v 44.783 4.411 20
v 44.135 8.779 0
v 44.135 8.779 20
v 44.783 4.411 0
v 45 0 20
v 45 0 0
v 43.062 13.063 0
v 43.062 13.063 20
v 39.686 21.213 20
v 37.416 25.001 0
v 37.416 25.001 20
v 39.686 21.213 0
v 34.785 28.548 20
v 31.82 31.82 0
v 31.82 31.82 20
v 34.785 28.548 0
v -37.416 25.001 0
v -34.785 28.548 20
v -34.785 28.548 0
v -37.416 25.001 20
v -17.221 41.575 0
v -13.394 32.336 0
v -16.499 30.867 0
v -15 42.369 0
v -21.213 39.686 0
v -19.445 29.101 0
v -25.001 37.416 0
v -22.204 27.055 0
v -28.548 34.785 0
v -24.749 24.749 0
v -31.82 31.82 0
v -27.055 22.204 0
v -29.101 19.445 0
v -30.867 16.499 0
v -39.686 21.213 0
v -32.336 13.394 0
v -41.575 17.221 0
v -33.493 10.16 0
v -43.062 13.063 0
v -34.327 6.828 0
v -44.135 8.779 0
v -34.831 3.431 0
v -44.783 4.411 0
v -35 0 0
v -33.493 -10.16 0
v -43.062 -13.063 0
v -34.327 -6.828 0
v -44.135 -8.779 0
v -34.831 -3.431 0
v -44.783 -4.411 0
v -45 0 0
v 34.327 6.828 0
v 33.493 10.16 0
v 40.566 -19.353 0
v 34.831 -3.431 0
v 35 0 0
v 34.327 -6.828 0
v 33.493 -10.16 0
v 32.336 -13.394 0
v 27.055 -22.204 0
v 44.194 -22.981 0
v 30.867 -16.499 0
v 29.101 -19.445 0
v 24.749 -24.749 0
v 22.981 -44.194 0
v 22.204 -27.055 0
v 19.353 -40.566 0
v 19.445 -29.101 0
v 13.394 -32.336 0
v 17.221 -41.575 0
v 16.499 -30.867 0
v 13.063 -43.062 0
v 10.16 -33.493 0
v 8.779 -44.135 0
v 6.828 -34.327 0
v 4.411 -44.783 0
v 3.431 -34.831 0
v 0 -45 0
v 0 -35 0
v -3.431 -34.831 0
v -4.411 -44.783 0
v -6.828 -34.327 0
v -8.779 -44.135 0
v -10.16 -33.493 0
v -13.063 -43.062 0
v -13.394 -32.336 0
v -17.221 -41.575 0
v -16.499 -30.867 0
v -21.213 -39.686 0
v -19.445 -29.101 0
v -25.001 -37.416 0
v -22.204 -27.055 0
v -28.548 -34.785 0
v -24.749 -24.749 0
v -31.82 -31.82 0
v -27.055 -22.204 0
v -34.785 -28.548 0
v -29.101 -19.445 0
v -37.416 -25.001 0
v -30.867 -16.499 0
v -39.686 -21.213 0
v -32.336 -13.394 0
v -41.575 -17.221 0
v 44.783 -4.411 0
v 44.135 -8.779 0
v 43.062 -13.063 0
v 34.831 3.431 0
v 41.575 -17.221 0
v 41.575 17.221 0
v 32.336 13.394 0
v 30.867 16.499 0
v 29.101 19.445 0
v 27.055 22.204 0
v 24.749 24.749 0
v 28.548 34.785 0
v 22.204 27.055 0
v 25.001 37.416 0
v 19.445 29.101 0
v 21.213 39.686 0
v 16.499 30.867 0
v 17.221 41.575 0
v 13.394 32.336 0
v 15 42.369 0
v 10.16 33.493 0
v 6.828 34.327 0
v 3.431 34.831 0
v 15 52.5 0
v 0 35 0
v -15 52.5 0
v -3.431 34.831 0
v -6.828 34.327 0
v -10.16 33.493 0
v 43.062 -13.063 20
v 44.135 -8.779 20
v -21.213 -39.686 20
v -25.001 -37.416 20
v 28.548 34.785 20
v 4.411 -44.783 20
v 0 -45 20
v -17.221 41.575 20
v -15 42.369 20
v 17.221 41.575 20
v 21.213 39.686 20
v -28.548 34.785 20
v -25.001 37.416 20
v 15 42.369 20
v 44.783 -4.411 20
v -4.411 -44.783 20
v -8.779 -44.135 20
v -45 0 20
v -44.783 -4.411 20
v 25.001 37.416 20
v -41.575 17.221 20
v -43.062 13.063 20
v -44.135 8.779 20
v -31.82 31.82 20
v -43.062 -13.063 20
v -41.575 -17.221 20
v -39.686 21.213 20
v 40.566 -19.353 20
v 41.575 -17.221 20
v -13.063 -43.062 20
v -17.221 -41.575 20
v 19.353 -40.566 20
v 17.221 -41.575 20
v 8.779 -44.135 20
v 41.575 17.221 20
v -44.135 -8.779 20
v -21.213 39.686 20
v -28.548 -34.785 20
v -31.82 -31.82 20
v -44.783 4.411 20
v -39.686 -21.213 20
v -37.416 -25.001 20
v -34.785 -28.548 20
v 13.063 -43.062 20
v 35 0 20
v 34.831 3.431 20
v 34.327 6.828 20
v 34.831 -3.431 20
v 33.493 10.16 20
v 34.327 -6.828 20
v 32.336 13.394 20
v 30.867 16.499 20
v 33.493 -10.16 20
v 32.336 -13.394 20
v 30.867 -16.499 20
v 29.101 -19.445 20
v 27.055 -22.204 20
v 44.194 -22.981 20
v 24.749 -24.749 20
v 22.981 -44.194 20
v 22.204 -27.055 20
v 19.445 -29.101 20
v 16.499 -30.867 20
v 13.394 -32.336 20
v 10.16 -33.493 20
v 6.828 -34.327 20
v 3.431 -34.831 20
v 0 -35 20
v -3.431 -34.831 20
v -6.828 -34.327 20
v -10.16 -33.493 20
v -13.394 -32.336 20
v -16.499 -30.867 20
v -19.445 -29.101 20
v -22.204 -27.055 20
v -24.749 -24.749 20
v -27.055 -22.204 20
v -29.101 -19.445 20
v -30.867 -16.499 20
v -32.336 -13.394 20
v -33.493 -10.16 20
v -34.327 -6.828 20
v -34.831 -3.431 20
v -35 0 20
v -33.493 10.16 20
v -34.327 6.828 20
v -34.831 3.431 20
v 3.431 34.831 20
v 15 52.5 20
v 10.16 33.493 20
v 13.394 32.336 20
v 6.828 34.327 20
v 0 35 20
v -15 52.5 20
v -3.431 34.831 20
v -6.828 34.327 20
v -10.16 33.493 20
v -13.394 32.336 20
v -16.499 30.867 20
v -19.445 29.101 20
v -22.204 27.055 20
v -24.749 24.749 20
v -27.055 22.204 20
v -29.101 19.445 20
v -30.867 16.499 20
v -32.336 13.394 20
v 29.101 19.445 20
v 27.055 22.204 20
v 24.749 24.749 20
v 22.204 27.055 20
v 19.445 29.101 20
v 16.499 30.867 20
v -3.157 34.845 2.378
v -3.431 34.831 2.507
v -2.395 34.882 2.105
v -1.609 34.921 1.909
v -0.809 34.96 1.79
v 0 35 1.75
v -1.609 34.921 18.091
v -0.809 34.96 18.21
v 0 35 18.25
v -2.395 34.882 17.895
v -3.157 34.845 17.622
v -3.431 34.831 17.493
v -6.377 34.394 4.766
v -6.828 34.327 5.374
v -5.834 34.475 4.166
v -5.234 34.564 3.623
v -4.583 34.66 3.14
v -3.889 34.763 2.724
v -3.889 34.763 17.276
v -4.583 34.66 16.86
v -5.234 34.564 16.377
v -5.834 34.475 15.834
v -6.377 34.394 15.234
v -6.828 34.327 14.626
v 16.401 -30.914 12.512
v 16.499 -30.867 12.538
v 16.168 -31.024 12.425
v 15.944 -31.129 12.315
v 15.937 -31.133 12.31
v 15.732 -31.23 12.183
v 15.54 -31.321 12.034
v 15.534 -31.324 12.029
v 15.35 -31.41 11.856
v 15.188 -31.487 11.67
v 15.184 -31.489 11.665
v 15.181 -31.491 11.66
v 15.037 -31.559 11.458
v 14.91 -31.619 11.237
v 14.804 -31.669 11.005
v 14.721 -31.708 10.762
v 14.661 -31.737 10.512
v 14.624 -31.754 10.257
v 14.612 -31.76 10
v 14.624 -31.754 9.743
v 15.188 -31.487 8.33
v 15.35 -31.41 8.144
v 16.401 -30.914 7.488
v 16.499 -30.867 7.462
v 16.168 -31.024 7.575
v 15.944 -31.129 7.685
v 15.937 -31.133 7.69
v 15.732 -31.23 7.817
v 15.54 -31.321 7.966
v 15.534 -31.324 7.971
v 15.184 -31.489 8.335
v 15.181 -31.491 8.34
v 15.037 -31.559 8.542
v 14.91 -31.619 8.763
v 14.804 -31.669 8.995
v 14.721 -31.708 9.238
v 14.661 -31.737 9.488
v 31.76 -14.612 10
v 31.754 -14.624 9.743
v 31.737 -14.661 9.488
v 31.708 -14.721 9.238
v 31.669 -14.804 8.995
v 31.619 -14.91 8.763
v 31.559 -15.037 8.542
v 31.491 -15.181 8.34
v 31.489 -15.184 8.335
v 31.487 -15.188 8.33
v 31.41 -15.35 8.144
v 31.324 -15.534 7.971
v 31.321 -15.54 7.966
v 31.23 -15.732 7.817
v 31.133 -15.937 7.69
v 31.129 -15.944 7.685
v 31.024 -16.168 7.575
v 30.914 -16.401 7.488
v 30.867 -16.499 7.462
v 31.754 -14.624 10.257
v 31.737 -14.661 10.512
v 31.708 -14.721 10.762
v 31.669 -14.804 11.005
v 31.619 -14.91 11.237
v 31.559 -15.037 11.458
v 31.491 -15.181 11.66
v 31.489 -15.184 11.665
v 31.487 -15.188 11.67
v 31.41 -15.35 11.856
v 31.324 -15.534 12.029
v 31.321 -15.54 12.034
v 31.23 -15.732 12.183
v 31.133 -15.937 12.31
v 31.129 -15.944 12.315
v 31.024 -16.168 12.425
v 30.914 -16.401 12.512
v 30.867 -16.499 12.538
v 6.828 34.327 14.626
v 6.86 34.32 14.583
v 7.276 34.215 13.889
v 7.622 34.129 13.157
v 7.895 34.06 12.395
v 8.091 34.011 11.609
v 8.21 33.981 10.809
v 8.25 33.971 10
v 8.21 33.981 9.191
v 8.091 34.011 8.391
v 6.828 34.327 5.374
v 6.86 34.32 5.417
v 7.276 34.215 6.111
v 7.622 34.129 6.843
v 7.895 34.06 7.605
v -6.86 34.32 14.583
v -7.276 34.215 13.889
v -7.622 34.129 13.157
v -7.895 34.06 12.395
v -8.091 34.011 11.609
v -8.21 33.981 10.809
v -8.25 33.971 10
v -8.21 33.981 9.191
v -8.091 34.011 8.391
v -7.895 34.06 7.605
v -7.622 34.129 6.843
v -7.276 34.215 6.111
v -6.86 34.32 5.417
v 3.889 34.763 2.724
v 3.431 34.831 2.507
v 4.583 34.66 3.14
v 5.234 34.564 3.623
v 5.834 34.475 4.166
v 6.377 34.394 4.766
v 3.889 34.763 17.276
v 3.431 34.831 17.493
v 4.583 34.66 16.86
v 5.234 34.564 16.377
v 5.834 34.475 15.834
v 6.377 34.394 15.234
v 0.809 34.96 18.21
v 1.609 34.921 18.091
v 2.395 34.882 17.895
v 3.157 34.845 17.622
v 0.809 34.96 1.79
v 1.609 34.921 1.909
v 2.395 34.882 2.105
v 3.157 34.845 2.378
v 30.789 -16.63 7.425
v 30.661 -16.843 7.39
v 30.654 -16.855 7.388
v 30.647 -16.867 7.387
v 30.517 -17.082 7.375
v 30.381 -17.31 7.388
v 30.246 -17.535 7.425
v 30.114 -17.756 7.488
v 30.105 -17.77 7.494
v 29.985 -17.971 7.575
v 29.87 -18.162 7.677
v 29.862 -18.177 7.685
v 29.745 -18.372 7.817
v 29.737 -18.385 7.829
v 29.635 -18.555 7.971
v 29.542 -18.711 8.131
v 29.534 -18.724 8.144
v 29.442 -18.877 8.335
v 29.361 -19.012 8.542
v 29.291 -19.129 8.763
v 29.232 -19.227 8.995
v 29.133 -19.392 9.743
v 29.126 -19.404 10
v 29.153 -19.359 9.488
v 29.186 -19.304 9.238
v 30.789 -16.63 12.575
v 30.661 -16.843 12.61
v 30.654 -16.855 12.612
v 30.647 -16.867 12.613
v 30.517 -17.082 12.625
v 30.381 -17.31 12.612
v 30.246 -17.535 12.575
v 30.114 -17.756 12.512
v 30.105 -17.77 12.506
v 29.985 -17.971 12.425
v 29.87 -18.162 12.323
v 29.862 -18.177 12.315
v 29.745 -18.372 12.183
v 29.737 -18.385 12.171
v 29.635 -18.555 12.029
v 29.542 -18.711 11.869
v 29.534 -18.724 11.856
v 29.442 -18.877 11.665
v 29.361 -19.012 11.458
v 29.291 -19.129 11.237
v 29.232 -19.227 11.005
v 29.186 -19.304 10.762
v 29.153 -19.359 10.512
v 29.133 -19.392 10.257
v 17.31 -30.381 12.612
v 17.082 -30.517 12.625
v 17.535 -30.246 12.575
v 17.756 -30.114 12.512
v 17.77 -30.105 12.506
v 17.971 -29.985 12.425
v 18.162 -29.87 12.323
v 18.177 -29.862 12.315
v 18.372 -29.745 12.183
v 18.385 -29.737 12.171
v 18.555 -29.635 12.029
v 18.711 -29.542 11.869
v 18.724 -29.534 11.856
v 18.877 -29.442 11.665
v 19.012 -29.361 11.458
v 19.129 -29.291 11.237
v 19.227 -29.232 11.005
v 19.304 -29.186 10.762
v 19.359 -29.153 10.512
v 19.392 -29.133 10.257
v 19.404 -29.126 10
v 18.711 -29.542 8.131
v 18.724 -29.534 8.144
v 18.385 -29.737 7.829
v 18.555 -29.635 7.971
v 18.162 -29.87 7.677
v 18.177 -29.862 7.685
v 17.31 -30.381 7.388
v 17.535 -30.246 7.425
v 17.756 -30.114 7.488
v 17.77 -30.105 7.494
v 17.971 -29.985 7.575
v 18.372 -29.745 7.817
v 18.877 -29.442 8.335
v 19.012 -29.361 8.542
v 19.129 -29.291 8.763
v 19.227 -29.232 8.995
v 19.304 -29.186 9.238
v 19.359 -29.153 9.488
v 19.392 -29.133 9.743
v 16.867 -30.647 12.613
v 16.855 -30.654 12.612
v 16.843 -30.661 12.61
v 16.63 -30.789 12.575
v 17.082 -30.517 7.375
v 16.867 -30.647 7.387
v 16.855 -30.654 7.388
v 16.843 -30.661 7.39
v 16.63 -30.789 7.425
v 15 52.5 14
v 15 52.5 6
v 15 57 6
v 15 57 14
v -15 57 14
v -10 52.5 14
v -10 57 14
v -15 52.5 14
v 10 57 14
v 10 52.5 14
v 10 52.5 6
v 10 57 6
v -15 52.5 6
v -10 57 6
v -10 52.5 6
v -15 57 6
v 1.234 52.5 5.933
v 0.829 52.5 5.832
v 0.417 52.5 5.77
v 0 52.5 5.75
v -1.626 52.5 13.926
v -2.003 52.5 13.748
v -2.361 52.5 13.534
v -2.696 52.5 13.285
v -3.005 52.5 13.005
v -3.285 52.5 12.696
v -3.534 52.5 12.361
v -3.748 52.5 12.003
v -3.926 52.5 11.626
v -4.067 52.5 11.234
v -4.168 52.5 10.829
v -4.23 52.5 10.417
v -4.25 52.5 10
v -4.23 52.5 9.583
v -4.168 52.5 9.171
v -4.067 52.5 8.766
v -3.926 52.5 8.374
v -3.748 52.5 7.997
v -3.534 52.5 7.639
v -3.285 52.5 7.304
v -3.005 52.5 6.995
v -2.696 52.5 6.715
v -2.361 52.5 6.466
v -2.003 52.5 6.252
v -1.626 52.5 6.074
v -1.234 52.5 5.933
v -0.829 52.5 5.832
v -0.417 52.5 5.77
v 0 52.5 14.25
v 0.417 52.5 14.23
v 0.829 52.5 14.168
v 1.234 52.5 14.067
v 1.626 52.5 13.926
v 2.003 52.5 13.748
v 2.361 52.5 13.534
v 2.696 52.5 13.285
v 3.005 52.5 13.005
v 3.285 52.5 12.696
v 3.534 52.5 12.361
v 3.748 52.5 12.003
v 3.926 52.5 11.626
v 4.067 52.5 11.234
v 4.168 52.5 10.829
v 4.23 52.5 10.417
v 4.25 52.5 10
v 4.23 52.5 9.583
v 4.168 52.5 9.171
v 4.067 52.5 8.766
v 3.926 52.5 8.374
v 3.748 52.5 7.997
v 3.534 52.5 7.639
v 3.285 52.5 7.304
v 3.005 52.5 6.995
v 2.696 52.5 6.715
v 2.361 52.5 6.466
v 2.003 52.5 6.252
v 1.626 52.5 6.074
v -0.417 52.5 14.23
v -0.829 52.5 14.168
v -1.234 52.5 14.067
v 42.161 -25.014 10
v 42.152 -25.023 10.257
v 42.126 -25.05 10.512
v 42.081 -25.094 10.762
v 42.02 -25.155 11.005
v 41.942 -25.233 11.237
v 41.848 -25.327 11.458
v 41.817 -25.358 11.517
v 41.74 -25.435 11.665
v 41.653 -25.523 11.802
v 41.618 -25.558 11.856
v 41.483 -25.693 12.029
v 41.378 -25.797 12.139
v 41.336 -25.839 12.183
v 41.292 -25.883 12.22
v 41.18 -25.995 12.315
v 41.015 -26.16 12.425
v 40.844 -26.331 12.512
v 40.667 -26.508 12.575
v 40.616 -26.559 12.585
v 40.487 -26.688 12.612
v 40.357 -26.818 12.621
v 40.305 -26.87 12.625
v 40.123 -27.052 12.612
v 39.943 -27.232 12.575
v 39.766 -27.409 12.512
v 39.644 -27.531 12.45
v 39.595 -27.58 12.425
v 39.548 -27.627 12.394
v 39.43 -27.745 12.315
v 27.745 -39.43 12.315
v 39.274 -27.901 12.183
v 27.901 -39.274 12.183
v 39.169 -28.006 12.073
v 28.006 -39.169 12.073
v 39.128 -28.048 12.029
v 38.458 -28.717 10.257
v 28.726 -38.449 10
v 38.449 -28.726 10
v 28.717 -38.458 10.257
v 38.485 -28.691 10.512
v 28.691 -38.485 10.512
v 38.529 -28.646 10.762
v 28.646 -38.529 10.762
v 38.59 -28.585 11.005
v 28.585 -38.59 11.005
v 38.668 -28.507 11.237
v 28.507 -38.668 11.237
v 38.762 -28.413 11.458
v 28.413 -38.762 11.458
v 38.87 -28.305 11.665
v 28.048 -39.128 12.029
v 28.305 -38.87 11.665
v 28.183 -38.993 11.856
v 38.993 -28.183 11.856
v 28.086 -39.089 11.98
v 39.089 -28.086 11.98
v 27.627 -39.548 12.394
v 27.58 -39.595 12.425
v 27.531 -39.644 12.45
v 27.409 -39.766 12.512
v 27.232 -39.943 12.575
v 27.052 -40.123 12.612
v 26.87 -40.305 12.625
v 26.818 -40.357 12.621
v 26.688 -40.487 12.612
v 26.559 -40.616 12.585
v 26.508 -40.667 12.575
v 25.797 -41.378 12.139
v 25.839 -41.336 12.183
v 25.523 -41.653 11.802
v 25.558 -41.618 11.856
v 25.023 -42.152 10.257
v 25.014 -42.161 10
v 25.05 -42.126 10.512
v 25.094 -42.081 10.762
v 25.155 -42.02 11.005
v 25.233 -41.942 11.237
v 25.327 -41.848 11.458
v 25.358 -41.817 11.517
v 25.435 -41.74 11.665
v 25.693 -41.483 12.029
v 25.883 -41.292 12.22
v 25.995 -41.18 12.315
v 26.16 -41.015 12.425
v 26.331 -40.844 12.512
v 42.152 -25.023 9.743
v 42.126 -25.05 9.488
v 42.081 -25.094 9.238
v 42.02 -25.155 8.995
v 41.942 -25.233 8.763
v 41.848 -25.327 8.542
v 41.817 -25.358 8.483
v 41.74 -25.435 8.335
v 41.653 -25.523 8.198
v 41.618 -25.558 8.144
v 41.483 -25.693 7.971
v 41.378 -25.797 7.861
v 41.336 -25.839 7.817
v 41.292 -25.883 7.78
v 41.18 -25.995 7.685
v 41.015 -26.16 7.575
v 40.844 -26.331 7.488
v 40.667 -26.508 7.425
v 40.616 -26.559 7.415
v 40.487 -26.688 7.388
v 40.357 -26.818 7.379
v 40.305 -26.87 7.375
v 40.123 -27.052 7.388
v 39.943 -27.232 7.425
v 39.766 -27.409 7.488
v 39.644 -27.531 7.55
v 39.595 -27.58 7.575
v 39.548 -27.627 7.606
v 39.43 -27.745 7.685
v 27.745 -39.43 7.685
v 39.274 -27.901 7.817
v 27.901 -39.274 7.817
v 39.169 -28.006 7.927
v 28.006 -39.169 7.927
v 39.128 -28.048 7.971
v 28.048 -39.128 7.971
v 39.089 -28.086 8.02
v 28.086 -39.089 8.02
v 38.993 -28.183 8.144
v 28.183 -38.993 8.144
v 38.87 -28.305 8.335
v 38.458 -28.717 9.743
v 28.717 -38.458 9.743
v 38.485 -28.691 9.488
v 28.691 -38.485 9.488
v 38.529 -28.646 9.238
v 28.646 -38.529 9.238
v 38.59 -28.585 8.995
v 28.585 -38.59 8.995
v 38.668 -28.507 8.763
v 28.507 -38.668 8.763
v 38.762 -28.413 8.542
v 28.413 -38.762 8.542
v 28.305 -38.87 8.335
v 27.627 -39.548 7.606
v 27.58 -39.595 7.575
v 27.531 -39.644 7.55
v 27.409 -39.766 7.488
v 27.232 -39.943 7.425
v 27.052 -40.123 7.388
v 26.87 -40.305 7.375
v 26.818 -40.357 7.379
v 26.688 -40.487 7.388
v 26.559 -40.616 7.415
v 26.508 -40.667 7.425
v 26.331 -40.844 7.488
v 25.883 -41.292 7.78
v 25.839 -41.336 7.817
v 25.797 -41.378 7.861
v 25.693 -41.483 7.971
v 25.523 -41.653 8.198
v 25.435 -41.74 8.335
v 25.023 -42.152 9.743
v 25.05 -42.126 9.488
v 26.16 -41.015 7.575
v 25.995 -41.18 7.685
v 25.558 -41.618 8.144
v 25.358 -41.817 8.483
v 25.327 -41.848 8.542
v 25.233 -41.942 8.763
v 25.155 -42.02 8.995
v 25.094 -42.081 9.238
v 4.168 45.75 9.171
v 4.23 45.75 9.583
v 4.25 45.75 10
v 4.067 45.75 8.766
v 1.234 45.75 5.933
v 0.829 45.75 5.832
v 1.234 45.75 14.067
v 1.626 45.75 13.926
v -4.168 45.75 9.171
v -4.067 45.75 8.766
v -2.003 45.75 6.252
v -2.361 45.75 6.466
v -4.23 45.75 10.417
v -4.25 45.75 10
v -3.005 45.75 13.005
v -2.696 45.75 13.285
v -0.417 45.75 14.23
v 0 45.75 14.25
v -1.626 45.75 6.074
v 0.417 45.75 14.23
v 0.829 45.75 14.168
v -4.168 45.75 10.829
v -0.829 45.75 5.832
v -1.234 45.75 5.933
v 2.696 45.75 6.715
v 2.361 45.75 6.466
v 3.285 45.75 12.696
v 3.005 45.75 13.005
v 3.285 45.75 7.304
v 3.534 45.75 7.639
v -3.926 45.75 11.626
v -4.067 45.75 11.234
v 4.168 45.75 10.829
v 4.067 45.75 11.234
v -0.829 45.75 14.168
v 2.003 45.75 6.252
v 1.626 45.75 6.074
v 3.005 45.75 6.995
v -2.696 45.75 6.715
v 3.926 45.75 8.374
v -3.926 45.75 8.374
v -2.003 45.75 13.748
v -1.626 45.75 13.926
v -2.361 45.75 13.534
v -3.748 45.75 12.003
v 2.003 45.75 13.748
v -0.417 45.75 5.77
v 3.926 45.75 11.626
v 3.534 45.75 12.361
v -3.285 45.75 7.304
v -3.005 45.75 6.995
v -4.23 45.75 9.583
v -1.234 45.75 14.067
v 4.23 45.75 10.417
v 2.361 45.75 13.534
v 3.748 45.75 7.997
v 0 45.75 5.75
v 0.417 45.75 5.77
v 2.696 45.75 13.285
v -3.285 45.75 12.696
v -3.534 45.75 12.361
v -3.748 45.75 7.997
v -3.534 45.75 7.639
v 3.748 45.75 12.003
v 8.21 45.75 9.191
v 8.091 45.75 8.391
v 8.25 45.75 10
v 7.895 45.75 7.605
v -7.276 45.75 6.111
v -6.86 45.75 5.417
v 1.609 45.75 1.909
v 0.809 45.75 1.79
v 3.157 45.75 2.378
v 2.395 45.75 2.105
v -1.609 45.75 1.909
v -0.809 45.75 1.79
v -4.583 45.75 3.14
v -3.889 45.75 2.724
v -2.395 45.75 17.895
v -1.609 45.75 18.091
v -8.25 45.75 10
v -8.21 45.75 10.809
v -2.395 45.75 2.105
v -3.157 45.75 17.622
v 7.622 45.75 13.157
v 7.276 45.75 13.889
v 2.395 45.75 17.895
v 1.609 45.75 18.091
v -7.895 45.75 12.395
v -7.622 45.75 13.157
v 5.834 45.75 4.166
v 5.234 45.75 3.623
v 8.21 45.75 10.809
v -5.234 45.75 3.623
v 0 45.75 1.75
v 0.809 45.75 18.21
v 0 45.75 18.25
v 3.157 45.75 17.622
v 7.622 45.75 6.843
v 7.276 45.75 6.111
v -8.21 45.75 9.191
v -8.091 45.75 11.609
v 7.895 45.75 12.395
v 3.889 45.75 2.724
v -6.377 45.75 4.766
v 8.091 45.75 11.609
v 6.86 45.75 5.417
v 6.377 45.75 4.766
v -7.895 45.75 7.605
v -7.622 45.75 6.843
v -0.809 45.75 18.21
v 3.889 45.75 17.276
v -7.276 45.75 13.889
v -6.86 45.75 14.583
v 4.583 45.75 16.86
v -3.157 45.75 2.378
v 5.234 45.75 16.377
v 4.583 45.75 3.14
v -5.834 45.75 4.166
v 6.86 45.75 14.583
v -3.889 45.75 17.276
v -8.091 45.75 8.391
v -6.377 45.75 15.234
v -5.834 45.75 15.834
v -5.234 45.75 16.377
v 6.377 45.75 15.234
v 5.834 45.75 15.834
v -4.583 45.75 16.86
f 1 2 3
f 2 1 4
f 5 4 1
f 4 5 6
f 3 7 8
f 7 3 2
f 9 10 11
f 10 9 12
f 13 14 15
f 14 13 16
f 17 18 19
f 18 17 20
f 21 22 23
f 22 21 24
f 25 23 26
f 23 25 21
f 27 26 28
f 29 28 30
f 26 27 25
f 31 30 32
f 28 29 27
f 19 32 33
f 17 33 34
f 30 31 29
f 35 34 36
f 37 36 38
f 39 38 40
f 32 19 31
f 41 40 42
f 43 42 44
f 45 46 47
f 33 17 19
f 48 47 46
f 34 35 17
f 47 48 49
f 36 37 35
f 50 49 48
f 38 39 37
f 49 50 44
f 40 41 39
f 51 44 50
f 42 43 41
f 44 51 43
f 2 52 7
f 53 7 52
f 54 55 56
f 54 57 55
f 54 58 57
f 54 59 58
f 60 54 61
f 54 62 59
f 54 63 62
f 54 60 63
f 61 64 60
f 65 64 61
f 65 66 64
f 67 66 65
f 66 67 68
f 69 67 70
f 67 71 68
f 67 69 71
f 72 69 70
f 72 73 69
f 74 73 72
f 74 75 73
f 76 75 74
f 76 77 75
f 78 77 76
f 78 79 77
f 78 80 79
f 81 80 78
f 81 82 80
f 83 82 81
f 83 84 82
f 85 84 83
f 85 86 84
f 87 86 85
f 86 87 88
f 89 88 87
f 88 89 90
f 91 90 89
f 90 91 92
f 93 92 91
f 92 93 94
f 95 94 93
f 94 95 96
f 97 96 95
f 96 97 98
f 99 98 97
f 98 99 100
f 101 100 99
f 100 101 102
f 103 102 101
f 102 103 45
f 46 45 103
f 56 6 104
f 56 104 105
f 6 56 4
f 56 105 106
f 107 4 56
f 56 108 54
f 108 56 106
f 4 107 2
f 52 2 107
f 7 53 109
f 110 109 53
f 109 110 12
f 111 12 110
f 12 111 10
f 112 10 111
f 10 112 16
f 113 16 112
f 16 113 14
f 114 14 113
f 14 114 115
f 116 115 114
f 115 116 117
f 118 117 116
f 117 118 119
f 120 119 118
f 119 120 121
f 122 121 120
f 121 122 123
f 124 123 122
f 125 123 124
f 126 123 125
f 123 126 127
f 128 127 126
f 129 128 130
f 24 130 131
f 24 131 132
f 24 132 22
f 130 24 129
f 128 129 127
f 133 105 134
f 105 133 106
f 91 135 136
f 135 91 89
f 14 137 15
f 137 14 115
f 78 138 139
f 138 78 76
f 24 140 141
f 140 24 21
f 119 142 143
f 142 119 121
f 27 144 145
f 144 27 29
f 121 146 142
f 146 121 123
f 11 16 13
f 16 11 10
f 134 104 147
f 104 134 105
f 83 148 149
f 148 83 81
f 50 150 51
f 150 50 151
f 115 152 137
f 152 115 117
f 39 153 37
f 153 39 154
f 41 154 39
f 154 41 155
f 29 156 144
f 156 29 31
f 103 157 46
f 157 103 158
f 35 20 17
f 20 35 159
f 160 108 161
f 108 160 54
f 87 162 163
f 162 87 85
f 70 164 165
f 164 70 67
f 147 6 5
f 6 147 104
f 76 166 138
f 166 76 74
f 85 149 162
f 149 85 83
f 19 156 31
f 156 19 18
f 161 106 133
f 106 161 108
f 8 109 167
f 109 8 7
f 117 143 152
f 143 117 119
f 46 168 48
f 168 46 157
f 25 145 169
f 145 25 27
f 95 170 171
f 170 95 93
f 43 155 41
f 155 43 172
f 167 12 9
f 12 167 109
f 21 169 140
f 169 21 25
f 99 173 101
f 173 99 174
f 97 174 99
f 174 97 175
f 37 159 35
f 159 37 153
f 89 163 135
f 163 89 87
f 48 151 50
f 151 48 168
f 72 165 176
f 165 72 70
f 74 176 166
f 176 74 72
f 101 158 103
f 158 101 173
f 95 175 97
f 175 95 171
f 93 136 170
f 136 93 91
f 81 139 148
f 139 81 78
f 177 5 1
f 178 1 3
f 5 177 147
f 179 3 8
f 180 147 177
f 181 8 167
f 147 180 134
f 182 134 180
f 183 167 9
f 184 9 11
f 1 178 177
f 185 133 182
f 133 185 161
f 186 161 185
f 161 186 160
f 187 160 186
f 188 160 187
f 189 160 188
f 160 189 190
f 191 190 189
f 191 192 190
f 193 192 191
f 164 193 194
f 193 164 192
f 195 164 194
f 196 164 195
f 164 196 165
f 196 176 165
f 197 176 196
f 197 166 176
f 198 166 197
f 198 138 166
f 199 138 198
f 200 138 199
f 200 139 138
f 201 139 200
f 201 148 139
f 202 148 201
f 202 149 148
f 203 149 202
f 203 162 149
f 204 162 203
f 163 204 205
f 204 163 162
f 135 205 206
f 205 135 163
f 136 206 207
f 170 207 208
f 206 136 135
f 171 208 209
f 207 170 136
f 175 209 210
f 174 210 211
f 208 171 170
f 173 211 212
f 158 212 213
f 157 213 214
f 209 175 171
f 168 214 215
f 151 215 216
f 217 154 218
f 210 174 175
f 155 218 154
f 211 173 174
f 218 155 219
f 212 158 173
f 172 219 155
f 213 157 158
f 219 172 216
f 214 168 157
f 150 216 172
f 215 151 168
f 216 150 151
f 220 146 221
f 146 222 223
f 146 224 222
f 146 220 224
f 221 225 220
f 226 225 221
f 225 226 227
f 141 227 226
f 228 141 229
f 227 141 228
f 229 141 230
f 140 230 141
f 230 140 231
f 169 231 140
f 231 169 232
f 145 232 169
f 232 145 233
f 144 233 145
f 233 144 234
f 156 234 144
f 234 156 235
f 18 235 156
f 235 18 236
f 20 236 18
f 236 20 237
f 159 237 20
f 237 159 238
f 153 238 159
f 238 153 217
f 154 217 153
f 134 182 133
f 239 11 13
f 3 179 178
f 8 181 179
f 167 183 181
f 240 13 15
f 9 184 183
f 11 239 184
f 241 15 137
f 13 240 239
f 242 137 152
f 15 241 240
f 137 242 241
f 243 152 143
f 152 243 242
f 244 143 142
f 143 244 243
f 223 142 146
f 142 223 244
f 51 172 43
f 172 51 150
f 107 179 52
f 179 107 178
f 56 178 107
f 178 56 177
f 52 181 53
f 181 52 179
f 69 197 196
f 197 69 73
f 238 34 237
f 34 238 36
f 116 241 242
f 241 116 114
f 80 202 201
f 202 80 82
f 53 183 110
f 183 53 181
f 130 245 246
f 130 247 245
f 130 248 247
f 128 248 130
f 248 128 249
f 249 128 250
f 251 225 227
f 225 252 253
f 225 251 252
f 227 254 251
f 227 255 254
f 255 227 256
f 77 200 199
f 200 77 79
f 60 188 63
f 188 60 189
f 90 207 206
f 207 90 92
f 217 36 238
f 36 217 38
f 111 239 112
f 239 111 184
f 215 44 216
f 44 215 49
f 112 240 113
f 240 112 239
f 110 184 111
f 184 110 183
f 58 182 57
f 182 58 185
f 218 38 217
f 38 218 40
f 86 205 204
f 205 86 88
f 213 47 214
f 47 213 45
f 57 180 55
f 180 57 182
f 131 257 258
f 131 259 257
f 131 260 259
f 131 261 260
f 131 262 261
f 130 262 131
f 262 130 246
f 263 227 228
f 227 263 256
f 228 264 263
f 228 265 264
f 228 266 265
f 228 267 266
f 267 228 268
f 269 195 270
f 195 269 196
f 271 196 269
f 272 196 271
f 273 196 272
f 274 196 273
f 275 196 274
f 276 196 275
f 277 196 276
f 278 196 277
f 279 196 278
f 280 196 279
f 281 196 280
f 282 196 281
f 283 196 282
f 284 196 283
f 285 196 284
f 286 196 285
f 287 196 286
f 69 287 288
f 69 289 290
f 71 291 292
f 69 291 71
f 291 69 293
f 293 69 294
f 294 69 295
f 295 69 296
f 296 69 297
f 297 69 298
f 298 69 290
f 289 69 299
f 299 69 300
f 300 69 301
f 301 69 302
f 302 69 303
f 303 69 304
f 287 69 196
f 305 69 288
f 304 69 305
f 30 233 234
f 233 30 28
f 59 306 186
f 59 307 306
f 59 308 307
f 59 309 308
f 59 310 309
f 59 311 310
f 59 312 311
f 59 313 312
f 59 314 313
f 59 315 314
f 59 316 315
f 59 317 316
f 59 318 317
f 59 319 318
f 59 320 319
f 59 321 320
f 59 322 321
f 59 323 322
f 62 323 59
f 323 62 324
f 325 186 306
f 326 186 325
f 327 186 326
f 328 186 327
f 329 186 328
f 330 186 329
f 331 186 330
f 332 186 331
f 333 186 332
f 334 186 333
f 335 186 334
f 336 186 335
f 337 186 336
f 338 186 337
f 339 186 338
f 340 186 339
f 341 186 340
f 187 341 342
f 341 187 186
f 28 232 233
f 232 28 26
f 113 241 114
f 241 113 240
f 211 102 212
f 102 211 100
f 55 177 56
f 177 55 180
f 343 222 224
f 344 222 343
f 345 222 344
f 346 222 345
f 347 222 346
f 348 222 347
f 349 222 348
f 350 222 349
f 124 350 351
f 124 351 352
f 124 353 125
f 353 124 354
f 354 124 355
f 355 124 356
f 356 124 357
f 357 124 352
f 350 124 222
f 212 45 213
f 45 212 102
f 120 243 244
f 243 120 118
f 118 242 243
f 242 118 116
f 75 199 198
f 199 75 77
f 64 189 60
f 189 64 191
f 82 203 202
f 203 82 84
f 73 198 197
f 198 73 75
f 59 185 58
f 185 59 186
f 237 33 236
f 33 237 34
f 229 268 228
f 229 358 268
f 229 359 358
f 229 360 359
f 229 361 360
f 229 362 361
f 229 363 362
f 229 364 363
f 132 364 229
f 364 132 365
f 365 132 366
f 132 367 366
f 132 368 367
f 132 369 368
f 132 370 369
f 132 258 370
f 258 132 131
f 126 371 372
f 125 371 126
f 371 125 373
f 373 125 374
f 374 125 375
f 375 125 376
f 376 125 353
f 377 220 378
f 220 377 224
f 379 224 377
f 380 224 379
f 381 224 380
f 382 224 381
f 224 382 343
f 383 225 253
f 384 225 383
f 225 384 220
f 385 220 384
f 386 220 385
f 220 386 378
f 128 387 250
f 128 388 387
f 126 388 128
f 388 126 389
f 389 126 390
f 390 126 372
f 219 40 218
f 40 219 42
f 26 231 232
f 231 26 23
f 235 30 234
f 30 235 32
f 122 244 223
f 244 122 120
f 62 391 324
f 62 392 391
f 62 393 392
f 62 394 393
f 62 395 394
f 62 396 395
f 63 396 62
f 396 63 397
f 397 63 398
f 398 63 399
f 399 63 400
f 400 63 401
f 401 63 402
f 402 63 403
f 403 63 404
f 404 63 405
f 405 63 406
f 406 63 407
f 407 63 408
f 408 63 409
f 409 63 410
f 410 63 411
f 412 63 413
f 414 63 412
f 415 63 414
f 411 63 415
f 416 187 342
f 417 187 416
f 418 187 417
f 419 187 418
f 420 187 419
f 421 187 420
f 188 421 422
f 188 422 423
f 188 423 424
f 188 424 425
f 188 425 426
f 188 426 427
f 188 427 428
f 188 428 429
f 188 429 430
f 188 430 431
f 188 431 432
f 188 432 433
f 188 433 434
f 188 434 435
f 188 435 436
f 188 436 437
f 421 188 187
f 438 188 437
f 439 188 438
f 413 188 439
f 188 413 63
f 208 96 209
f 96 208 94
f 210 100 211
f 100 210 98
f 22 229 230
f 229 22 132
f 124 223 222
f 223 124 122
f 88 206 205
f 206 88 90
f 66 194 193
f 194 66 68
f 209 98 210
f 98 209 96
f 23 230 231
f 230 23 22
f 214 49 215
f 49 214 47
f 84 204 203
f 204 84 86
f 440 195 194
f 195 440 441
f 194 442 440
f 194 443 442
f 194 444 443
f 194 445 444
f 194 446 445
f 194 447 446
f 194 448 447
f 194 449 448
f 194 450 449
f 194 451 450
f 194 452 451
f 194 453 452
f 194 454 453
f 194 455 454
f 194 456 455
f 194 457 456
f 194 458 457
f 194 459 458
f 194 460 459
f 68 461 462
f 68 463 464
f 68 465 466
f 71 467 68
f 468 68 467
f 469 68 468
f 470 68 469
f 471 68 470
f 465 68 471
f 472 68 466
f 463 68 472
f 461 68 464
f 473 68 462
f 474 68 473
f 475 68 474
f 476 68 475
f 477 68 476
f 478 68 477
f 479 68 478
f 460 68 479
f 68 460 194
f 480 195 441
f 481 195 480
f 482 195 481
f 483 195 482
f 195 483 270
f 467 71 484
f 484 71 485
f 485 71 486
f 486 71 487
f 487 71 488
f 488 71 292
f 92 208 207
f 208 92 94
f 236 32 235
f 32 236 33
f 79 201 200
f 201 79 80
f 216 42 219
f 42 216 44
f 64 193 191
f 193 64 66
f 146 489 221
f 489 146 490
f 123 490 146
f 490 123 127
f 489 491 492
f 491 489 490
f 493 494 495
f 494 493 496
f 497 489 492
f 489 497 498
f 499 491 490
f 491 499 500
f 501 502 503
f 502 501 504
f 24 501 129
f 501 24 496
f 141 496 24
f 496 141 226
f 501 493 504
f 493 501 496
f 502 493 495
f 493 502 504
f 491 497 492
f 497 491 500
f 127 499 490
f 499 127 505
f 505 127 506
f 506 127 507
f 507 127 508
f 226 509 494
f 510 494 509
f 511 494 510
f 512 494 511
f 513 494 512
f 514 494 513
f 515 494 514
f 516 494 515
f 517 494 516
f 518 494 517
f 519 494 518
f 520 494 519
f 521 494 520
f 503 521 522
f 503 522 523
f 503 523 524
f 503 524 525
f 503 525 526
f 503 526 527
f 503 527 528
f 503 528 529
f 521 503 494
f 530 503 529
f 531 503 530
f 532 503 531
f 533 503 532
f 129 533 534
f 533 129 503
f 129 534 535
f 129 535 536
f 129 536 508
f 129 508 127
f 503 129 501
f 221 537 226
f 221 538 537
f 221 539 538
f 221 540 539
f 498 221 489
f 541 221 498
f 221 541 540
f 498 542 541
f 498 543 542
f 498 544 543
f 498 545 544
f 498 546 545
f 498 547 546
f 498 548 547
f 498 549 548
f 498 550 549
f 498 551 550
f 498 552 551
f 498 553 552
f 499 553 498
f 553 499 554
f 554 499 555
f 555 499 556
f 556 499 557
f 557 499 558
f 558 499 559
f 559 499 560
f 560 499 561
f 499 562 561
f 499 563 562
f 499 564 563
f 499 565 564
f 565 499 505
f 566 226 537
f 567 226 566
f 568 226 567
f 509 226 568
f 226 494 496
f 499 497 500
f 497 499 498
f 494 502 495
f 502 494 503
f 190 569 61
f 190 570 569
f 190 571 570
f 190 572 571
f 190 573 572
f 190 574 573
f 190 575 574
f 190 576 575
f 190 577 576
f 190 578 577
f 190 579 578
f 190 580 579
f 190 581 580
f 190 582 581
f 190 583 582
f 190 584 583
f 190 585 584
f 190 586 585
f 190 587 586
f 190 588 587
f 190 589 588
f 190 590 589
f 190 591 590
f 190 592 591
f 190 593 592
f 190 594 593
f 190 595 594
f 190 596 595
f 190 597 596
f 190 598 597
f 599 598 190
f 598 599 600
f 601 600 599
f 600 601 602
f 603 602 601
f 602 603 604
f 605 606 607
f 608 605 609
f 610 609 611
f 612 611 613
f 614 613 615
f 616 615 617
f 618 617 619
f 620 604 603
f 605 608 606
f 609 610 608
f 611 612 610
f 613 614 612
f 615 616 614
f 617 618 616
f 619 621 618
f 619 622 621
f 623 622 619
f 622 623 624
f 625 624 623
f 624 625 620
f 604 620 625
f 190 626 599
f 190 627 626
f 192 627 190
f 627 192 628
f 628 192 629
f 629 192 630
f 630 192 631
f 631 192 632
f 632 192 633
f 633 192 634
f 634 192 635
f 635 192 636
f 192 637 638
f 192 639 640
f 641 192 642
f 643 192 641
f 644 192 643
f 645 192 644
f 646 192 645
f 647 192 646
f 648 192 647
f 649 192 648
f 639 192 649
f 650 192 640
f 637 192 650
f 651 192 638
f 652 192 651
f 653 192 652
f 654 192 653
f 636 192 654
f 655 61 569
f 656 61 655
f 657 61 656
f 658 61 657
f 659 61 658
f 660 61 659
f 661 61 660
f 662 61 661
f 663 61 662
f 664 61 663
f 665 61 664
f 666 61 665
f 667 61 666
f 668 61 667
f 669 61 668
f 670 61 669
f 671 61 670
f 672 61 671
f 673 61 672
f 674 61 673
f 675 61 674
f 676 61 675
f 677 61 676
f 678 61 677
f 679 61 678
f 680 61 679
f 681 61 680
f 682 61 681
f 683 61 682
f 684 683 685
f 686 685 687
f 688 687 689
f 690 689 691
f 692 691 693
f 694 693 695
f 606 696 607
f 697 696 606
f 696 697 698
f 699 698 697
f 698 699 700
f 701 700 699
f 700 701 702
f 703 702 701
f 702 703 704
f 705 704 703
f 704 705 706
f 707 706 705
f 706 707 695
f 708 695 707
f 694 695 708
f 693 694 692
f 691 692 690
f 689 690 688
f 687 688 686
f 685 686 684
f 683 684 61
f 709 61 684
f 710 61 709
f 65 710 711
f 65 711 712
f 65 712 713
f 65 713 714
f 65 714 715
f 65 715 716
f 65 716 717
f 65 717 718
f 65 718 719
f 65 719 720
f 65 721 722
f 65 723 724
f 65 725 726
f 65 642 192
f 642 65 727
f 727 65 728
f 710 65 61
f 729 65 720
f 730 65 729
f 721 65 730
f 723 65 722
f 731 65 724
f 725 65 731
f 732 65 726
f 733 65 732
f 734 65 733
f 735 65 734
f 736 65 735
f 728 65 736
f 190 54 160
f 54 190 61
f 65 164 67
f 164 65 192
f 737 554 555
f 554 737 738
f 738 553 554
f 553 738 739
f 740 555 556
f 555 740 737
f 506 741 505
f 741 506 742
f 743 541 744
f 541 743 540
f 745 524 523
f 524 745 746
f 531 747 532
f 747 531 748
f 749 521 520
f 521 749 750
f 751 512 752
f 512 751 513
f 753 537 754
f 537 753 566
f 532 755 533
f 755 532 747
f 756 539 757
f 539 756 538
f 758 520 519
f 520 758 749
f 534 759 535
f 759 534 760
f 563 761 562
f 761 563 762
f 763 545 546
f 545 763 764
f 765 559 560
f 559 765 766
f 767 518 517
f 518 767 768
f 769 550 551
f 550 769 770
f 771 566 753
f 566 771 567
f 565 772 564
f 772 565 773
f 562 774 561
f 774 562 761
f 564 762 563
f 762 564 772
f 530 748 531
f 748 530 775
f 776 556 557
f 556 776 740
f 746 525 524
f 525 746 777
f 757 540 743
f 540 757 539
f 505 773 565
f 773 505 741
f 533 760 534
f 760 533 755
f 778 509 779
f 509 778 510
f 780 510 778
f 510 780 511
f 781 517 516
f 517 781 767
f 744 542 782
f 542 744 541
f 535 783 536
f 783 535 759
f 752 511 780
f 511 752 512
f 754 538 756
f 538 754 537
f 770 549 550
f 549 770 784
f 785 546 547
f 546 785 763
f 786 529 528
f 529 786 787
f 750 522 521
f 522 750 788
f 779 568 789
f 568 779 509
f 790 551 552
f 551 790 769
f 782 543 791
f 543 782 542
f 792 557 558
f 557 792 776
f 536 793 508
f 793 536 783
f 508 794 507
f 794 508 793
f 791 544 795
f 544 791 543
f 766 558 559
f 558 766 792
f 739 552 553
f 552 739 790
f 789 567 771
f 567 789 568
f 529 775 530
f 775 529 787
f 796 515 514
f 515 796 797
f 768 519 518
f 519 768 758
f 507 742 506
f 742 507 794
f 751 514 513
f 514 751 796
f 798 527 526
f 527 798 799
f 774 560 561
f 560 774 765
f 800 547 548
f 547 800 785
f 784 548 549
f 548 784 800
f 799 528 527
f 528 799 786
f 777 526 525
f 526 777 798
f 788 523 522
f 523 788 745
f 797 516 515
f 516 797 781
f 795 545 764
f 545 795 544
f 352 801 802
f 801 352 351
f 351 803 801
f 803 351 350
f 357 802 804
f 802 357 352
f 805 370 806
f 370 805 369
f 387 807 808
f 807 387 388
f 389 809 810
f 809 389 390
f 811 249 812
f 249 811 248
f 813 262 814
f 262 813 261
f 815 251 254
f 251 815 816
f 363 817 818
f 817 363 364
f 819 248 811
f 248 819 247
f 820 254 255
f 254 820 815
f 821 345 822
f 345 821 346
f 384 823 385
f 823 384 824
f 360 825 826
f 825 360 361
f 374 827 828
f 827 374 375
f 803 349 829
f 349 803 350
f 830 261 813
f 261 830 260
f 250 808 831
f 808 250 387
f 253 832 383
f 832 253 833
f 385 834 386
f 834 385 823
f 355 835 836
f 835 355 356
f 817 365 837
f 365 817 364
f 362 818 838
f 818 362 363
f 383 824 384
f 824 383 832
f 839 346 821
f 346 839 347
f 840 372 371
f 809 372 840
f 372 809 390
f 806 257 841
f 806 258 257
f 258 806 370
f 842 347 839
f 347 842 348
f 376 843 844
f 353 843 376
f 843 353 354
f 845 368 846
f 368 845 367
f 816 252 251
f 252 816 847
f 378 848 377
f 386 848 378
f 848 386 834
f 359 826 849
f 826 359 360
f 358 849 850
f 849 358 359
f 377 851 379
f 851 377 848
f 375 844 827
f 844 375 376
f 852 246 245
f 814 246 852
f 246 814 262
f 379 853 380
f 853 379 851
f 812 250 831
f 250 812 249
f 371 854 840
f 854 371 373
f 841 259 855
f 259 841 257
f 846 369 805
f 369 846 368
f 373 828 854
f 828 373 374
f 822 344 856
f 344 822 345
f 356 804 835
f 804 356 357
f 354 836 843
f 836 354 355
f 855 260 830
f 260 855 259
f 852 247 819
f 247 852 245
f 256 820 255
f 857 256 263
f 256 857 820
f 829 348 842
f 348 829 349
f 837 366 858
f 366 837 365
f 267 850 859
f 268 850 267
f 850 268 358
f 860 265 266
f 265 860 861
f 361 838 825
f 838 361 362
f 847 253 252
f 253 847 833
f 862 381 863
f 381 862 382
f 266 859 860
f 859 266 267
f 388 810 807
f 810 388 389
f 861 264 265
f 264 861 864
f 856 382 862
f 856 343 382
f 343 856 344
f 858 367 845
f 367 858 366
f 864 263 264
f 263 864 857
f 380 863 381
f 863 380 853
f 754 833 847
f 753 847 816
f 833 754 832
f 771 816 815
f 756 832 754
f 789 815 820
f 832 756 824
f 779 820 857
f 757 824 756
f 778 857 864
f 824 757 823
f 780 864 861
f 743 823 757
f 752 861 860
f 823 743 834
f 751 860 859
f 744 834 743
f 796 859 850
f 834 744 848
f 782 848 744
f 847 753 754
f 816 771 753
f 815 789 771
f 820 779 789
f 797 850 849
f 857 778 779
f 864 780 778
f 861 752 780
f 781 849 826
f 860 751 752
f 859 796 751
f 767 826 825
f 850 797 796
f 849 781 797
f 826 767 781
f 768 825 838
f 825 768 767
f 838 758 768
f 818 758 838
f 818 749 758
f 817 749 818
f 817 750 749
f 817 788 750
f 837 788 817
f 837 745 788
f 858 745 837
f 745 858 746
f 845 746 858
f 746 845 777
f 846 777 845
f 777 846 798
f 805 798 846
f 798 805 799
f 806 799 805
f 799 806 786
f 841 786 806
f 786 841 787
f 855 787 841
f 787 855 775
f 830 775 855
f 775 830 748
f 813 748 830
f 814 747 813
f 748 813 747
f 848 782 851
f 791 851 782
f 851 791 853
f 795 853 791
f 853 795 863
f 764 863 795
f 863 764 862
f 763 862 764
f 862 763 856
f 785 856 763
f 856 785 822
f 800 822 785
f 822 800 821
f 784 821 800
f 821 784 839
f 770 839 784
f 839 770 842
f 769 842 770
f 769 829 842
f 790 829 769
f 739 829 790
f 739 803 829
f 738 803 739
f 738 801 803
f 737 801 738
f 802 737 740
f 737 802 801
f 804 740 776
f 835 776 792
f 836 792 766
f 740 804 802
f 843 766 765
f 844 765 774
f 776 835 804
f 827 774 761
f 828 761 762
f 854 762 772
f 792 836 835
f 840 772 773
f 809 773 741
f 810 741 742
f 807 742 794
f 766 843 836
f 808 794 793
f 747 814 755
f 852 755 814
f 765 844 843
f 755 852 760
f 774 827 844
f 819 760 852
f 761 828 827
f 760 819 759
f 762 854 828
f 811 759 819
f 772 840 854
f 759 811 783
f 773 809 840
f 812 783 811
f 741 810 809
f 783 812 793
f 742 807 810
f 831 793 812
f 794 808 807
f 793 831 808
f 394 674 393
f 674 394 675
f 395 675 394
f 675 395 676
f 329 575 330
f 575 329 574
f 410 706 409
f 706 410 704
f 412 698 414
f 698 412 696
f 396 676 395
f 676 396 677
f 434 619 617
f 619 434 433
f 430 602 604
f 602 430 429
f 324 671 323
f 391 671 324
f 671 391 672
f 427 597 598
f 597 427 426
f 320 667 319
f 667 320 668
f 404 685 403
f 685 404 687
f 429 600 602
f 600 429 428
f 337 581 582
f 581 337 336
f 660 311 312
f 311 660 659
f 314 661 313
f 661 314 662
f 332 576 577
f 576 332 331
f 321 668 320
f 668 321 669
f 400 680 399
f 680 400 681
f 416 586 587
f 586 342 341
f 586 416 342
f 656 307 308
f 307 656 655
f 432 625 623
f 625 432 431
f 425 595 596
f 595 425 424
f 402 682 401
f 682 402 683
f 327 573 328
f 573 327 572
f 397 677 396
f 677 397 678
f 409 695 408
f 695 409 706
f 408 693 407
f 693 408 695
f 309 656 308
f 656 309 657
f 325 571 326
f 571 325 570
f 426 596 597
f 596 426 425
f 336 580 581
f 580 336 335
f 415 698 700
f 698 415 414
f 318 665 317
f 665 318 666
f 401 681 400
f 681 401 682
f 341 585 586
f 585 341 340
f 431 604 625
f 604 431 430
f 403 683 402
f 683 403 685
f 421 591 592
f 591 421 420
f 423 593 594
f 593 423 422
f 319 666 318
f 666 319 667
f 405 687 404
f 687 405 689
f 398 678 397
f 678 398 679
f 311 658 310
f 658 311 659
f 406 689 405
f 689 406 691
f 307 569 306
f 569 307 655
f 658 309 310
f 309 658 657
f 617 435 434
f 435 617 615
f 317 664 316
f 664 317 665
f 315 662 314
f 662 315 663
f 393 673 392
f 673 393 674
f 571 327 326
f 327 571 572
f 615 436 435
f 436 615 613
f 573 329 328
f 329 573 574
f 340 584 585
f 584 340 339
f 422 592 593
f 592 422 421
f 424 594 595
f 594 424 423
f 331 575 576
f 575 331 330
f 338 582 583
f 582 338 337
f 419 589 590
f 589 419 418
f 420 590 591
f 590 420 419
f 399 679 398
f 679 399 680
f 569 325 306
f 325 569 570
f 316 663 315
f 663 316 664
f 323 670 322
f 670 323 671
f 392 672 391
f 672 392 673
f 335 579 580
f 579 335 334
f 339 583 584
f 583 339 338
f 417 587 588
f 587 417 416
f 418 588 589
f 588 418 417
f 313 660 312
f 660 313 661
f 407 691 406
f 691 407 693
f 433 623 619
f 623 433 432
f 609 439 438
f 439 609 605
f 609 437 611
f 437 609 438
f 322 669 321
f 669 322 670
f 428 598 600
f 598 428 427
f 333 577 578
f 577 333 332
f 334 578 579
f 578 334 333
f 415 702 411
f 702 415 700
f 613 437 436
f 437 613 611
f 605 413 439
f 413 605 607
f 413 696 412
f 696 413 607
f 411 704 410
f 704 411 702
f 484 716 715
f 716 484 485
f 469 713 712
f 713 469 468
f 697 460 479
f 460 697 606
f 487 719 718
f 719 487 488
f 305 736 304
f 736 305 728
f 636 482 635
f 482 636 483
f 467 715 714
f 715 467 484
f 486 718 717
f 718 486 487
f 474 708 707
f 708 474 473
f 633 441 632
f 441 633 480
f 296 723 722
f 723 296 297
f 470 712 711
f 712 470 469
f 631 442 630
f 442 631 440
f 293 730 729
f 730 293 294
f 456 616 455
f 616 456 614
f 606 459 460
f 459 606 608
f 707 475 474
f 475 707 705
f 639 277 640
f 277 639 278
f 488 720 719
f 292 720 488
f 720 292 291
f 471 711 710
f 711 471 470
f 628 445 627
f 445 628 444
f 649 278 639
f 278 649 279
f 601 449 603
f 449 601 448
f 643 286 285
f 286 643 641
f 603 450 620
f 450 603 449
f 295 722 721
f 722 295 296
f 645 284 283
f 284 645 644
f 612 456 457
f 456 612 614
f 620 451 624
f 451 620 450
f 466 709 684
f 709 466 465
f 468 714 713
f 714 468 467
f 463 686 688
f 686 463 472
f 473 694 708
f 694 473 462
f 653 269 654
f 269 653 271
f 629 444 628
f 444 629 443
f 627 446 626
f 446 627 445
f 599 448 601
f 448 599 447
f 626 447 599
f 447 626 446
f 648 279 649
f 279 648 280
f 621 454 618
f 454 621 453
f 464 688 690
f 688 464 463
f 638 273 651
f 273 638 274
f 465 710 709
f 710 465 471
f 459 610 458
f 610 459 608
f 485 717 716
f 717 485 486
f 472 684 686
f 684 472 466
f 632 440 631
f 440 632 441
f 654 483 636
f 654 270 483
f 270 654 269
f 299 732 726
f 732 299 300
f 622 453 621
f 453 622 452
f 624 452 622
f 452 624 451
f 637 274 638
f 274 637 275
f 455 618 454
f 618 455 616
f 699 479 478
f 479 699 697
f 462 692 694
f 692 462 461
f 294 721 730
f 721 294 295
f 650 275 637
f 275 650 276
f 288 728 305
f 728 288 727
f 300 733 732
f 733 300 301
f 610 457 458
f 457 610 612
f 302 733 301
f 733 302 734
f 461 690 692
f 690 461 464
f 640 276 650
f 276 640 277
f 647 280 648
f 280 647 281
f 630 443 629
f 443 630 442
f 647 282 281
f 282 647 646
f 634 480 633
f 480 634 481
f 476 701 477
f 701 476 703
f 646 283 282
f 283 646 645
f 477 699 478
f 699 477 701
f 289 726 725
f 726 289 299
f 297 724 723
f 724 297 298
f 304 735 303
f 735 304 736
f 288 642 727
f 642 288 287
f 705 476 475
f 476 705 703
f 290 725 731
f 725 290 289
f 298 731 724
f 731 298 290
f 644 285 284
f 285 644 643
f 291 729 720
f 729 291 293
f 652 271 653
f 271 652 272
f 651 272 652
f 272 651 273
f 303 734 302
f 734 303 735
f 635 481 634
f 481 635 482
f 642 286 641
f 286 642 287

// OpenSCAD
// Föhnhalter, vong Bad her
$fn=64;
ring = [70, 20];
wall = 10;
chole = [5.25, 21, 19];
crot = -45;
shole = [4, 9, 2];
wallcube = [30, 12.5];
alu = [40, 8, 4.5];
alu_screw = [16.5, 8.5, 12];
insert_z = 20;

difference(){
	union(){
		difference(){
			cylinder(d=ring.x + 2*wall, h=ring.y);
			cylinder(d=ring.x, h=ring.y);
		}
		translate([-wallcube.x/2, ring.x/2+wall/2, 0]) cube([wallcube.x, wallcube.y, ring.y]);
		translate([-wallcube.x/2, ring.x/2+wallcube.y + wall/2, ring.y/2-alu.y/2]) difference(){
			 cube([wallcube.x, alu.z, alu.y]);
			 translate([wallcube.x/2-insert_z/2, 0, 0]) cube([insert_z, alu.z, alu.y]);

		}
		rotate([0, 0, crot]) translate([ring.x/2, -wallcube.x/2, 0]) cube([wallcube.y, wallcube.x, ring.y]);
	}

	translate([0, ring.x/2 - wallcube.y/2, ring.y/2]) rotate([-90, 0, 0]) cylinder(d=alu_screw.y, h=wallcube.y*2);
	translate([0, ring.x/2 - 1.25, ring.y/2]) rotate([-90, 0, 0]) cylinder(d=alu_screw.x, h=alu_screw.z);
	rotate([0, 0, crot]) translate([ring.x/2 - 2.5, chole.z/2, ring.y/2]) rotate([0, 90, 0]) cylinder(d=chole.x, h=chole.y);
	rotate([0, 0, crot]) translate([ring.x/2 - 2.5, -chole.z/2, ring.y/2]) rotate([0, 90, 0]) cylinder(d=chole.x, h=chole.y);
}
